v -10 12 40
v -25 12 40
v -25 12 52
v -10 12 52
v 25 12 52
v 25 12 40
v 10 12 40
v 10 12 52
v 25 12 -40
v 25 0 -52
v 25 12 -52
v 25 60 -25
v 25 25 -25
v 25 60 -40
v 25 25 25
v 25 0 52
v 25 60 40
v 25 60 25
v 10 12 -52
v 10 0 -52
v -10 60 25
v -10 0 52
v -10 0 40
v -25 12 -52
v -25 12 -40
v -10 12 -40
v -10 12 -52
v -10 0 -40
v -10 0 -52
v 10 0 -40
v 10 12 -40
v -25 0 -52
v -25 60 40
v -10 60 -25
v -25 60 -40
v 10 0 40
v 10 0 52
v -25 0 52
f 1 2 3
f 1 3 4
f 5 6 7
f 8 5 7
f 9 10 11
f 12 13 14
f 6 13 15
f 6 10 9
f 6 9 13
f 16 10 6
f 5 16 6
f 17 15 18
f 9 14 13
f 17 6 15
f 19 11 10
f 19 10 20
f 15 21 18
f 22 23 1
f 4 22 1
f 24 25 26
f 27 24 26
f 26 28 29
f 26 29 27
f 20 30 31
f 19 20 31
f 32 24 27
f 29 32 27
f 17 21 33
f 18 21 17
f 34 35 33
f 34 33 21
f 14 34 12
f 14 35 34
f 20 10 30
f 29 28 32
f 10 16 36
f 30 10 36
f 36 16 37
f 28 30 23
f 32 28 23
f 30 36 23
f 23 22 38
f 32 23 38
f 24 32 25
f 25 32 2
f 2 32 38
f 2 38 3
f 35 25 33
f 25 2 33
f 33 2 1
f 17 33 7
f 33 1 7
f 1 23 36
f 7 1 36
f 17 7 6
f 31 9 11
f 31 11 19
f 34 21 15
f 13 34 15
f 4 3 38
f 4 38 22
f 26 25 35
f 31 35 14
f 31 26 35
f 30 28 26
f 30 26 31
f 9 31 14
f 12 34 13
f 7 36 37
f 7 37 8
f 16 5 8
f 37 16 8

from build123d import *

# Parameters (mm, degrees)
IZIM1_W                     = 50
IZIM1_H                     = 80
Y_KSEKLIK_EKSTR_ZYON2_DEPTH = 60
IZIM2_W                     = 15
IZIM2_H                     = 12
Y_KSEKLIK_EKSTR_ZYON3_DEPTH = 12
AYNALAMA2_COPY_1_SKETCH_W   = 15
AYNALAMA2_COPY_1_SKETCH_H   = 12
AYNALAMA2_COPY_1_DEPTH      = 12
KES_EKSTR_ZYON1_DEPTH       = 50


with BuildPart() as part:
    # Çizim1 → Yükseklik-Ekstrüzyon2 (new body)
    with BuildSketch(Plane(origin=(0, 0, 0), x_dir=(1, 0, 0), z_dir=(0, 1, 0))):
        Rectangle(IZIM1_W, IZIM1_H)
    extrude(amount=Y_KSEKLIK_EKSTR_ZYON2_DEPTH)

    # Çizim2 → Yükseklik-Ekstrüzyon3 (add)
    with BuildSketch(Plane.XY.offset(40)):
        with Locations((-17.5, 6)):
            Rectangle(IZIM2_W, IZIM2_H)
    y_kseklik_ekstr_zyon3 = extrude(amount=Y_KSEKLIK_EKSTR_ZYON3_DEPTH)

    # Aynalama1: Yükseklik-Ekstrüzyon3 across plane
    add(y_kseklik_ekstr_zyon3.mirror(Plane(origin=(0, 0, 0), x_dir=(0, 0, 1), z_dir=(1, 0, 0))))

    # Aynalama2: Yükseklik-Ekstrüzyon3 across plane
    add(y_kseklik_ekstr_zyon3.mirror(Plane.XY))

    # Aynalama2 copy 1 sketch → Aynalama2 copy 1 (add)
    with BuildSketch(Plane(origin=(0, 0, -40), x_dir=(-1, 0, 0), z_dir=(0, 0, -1))):
        with Locations((-17.5, 6)):
            Rectangle(AYNALAMA2_COPY_1_SKETCH_W, AYNALAMA2_COPY_1_SKETCH_H)
    extrude(amount=AYNALAMA2_COPY_1_DEPTH)

    # Çizim3 → Kes-Ekstrüzyon1 (cut)
    with BuildSketch(Plane.XY.offset(25)):
        Polygon((-10, 60), (25, 25), (25, 60), align=None)
    extrude(amount=-KES_EKSTR_ZYON1_DEPTH, mode=Mode.SUBTRACT)


solid = part.part
